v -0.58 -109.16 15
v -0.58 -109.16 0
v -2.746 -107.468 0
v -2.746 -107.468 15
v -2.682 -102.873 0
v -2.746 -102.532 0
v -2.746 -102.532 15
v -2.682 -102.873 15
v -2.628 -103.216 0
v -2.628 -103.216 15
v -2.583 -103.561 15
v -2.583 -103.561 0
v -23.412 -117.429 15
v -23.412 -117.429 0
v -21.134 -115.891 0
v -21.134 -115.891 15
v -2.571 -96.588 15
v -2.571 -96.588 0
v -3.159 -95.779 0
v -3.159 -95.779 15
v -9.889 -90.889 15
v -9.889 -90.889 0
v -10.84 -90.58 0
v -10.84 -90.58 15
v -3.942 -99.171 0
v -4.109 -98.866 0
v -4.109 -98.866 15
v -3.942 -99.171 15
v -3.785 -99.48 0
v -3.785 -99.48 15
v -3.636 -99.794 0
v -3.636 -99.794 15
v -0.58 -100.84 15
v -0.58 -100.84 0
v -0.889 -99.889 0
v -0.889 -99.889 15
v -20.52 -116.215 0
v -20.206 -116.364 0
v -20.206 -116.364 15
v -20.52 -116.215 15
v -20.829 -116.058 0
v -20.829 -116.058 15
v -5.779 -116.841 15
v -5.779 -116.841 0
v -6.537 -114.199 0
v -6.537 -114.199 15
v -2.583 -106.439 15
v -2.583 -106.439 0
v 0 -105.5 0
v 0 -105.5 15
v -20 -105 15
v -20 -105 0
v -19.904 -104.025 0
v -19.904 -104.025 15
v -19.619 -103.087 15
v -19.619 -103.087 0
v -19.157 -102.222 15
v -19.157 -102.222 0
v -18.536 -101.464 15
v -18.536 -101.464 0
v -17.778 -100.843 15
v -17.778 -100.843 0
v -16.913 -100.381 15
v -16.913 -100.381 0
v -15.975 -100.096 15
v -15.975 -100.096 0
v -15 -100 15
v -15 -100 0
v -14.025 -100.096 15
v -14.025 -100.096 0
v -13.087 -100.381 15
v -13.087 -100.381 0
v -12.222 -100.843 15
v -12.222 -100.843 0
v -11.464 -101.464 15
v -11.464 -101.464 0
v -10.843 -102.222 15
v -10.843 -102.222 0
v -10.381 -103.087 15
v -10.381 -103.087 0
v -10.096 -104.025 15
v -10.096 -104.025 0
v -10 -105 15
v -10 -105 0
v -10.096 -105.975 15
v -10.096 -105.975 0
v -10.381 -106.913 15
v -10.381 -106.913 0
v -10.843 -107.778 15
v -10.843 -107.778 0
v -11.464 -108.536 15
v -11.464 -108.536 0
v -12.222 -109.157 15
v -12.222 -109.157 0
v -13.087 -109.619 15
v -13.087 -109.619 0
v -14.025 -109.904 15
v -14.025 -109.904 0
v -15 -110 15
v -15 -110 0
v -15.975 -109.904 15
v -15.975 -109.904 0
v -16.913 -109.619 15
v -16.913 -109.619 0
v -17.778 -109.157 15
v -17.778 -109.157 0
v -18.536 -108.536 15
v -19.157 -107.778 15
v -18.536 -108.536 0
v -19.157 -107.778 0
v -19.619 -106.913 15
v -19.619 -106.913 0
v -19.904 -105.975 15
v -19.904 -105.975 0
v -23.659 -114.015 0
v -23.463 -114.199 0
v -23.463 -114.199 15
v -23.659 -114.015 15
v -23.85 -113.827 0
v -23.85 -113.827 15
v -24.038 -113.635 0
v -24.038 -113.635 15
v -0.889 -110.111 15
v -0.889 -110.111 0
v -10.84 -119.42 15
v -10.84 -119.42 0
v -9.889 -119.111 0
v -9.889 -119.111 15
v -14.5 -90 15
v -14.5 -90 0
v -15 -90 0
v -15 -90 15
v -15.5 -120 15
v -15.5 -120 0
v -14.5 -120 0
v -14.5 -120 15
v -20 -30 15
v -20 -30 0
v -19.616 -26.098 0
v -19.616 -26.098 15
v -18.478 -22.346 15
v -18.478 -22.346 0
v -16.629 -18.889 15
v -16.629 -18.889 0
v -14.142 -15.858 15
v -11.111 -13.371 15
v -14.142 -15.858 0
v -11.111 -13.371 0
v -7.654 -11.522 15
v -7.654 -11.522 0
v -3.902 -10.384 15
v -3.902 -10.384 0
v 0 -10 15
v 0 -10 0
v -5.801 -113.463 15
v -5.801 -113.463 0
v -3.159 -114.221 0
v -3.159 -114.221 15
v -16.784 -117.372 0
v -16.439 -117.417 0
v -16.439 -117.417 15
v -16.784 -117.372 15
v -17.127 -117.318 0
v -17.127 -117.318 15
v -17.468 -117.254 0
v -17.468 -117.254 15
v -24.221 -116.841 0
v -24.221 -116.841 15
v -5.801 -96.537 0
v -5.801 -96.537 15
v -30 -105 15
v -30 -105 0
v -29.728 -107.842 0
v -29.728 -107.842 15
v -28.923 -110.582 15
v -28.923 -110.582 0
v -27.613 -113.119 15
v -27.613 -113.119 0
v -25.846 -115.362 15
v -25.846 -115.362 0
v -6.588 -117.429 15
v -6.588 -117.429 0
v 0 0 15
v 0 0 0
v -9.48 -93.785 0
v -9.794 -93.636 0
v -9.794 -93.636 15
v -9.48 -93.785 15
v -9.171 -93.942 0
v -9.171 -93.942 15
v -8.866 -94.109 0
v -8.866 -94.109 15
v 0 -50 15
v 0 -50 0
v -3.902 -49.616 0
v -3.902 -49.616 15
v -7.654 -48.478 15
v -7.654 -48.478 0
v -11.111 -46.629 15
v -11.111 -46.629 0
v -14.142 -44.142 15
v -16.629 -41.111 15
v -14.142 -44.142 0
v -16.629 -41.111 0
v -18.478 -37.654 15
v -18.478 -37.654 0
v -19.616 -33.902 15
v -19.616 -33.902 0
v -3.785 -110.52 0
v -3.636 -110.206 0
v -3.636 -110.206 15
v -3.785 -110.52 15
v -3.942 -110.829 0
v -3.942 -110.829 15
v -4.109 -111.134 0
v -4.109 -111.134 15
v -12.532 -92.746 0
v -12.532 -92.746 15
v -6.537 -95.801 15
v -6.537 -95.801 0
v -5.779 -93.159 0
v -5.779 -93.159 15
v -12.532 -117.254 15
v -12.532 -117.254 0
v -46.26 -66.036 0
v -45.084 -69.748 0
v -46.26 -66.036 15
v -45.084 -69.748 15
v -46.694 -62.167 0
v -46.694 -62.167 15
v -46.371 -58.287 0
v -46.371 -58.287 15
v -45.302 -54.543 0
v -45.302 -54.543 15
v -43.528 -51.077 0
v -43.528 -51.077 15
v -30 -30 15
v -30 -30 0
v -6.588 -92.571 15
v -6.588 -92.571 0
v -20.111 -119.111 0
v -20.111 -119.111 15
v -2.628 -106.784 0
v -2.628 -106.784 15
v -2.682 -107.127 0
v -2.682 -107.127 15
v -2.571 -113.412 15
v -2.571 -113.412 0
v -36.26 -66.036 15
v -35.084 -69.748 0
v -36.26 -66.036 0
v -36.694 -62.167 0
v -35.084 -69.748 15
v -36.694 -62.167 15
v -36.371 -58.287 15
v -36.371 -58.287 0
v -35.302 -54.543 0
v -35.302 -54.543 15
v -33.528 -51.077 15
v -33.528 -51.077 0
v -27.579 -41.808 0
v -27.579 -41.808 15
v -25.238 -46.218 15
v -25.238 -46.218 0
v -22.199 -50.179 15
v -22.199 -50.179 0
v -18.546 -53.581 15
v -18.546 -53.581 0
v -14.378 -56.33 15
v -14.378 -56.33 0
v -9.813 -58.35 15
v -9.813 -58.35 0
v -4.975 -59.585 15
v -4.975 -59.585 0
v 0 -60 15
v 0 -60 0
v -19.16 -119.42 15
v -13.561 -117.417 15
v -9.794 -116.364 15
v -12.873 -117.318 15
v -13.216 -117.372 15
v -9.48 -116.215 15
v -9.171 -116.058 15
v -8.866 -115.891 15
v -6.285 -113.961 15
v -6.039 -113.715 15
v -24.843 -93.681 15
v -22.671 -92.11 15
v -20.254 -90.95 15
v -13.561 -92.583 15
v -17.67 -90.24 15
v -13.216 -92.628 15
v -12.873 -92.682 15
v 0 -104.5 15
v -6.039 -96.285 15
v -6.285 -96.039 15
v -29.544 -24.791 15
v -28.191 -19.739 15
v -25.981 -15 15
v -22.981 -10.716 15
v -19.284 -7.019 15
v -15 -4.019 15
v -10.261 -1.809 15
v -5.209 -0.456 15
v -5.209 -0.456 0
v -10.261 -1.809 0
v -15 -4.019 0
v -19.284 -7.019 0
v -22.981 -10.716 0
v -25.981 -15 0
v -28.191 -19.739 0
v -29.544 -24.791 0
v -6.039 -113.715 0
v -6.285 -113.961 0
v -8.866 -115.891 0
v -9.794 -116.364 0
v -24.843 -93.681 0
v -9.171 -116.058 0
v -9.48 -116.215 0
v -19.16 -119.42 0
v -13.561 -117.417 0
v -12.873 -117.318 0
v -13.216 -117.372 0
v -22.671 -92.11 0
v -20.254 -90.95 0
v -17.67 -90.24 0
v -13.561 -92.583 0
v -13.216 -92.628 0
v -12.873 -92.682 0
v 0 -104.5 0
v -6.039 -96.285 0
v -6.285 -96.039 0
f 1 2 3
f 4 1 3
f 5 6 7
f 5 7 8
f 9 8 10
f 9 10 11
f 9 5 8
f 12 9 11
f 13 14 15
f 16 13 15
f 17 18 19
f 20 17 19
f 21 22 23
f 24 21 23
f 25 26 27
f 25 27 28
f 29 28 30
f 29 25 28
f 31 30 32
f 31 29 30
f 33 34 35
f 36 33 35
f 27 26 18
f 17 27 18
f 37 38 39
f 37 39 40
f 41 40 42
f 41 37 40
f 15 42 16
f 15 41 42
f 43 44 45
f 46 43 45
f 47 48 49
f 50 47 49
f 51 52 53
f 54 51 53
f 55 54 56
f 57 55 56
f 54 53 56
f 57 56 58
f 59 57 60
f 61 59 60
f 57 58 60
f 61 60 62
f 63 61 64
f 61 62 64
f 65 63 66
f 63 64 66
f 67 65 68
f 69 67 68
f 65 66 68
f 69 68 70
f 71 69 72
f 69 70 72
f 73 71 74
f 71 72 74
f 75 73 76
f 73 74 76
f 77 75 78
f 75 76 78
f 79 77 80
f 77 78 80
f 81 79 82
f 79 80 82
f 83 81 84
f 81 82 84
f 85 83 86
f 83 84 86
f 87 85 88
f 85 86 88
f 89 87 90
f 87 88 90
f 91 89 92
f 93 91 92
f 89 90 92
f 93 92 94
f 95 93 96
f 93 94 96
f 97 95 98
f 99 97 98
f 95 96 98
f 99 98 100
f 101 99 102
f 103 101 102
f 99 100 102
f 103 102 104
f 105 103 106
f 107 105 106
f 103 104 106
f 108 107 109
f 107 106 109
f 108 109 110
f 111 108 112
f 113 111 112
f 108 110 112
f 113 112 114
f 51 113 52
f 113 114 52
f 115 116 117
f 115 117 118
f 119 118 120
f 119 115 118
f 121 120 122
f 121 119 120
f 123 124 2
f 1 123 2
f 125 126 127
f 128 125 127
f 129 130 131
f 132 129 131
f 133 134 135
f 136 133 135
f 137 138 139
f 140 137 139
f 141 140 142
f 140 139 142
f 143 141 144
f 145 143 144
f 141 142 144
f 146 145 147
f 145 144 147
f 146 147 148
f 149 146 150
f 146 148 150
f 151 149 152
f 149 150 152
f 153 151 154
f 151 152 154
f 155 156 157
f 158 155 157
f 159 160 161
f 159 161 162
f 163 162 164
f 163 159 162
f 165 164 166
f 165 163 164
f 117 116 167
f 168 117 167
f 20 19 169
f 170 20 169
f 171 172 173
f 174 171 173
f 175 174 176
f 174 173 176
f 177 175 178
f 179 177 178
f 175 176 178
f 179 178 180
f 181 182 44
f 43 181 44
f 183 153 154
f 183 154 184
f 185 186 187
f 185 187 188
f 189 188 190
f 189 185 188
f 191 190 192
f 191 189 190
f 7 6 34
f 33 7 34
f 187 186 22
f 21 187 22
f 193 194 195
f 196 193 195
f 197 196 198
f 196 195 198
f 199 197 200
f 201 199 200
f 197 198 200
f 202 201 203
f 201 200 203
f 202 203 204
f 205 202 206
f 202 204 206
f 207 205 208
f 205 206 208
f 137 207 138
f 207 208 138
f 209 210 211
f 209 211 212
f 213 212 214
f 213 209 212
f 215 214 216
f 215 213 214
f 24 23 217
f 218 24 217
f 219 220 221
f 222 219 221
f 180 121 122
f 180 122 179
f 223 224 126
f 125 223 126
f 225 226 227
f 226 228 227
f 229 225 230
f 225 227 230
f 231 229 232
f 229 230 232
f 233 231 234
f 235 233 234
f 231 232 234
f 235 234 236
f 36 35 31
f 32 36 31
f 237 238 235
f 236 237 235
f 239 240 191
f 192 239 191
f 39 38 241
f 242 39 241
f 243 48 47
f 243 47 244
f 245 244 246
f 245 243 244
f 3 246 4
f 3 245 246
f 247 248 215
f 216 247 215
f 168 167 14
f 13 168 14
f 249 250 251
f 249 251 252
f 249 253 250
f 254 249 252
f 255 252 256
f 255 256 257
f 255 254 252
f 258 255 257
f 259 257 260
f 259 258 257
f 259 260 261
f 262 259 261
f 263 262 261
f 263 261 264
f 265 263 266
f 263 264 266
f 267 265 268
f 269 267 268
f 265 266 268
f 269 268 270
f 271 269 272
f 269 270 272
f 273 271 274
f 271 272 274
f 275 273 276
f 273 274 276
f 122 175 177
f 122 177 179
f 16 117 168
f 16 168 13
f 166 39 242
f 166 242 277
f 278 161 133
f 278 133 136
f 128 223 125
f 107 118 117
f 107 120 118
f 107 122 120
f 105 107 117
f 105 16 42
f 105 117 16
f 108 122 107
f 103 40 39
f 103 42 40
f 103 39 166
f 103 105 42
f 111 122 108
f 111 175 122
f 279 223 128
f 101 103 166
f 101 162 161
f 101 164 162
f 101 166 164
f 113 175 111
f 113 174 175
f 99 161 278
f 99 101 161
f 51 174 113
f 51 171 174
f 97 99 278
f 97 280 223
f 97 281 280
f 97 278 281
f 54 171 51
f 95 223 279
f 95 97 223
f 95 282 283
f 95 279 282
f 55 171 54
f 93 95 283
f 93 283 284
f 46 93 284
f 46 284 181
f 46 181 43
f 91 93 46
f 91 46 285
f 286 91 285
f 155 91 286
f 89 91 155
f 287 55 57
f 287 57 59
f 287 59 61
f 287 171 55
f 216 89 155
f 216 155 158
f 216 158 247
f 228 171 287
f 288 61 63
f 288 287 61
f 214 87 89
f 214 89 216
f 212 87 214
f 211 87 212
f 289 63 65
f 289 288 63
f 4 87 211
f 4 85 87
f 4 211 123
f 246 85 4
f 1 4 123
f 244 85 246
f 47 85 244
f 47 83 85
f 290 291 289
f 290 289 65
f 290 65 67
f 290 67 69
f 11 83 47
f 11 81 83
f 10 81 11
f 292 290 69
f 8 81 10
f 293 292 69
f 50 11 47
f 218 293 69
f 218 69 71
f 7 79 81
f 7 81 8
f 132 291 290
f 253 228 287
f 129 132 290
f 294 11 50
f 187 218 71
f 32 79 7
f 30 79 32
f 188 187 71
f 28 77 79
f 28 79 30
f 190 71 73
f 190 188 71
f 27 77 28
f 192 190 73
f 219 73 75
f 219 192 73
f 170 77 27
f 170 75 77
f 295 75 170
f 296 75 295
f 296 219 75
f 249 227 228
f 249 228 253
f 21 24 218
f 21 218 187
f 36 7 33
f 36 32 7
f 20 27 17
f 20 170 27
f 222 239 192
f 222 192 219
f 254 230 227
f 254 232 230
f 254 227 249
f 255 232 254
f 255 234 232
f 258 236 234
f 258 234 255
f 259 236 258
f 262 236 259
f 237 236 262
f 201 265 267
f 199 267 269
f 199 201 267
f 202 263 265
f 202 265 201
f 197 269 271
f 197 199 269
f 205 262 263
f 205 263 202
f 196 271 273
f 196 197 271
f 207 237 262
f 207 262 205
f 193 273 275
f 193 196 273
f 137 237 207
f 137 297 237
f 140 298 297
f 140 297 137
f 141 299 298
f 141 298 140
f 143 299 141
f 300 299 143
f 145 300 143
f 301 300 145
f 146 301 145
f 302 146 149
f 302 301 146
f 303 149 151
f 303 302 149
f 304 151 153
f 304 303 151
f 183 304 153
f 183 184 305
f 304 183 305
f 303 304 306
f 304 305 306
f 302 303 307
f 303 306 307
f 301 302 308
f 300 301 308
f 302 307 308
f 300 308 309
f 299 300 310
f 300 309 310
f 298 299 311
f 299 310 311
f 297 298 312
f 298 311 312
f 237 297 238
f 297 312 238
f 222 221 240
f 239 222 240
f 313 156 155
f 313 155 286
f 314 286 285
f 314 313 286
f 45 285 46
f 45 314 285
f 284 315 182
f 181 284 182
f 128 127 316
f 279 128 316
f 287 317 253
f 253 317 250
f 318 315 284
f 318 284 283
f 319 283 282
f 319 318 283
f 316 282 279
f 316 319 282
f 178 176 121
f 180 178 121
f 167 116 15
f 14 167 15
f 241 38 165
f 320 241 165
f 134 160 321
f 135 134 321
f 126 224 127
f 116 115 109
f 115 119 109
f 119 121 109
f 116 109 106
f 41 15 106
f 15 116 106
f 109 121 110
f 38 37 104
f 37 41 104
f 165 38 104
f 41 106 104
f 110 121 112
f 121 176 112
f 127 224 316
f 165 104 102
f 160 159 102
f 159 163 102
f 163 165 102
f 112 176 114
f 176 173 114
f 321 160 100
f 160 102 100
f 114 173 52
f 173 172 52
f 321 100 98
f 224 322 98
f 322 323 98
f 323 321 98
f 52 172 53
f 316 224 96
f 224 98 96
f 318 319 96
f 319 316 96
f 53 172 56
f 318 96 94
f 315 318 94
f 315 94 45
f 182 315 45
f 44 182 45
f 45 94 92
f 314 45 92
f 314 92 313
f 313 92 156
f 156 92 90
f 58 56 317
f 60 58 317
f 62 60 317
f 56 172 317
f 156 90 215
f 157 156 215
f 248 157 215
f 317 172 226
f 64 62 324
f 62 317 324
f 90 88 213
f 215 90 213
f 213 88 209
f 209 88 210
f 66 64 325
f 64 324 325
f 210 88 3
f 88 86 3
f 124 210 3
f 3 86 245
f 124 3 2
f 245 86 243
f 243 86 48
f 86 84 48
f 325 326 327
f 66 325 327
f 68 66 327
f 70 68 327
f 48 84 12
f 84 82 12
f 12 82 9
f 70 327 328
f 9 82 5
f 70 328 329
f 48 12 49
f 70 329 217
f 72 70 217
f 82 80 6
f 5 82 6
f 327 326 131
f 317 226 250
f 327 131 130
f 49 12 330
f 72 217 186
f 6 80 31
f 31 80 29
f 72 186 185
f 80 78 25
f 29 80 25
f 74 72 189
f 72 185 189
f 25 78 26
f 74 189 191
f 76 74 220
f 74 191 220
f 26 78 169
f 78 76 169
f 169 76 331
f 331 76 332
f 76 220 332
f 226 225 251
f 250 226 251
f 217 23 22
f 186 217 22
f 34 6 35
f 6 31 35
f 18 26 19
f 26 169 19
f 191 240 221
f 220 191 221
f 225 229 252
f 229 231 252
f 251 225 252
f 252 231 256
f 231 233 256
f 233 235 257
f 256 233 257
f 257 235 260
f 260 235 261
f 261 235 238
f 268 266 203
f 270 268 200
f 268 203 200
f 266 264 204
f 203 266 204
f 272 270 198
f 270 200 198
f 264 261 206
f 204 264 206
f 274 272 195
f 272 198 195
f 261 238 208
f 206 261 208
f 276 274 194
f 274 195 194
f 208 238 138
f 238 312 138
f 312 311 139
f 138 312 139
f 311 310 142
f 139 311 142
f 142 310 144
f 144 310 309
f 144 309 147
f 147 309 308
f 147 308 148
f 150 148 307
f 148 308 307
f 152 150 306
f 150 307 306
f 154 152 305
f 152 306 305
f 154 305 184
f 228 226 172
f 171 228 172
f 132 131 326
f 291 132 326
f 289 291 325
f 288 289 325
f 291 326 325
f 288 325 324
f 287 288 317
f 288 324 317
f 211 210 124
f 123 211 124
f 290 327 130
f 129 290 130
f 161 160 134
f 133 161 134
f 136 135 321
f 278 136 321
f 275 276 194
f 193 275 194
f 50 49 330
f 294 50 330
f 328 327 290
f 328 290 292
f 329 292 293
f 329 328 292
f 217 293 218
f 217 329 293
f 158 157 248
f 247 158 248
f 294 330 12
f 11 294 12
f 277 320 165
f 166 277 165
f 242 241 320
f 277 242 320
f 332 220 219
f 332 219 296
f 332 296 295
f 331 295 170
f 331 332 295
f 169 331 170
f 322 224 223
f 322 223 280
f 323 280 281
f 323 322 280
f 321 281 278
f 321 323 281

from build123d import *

# Parameters (mm, degrees)
BOSS_EXTRUDE1_DEPTH = 15
FILLET1_R           = 20
CUT_EXTRUDE1_START  = -15
CUT_EXTRUDE1_DEPTH  = 15
BOSS_EXTRUDE2_START = -15
BOSS_EXTRUDE2_DEPTH = 15


with BuildPart() as part:
    # Sketch1 → Boss-Extrude1 (new body)
    # profile 1 of 6: a face of its own
    with BuildSketch(Plane.XY):
        with BuildLine():
            Line((-20, -30), (-30, -30))
            ThreePointArc((-30, -30), (-29.388396861, -36.026784376), (-27.578524672, -41.807835403))
            Line((-27.578524672, -41.807835403), (-20, -30))
        make_face()
    # profile 2 of 6: a face of its own
    with BuildSketch(Plane.XY):
        with BuildLine():
            Line((0, -10), (0, 0))
            ThreePointArc((0, 0), (-21.213203436, -8.786796564), (-30, -30))
            Line((-30, -30), (-20, -30))
            ThreePointArc((-20, -30), (-14.142135624, -15.857864376), (0, -10))
        make_face()
    # profile 3 of 6: a face of its own
    with BuildSketch(Plane.XY):
        with BuildLine():
            Line((0, -60), (0, -50))
            ThreePointArc((0, -50), (-14.142135624, -44.142135624), (-20, -30))
            Line((-20, -30), (-27.578524672, -41.807835403))
            ThreePointArc((-27.578524672, -41.807835403), (-16.519154608, -55.04231481), (0, -60))
        make_face()
    # profile 4 of 6: a face of its own
    with BuildSketch(Plane.XY):
        with BuildLine():
            ThreePointArc((-27.578524672, -41.807835403), (-29.388396861, -36.026784376), (-30, -30))
            Line((-30, -30), (-49.254650189, -60))
            Line((-49.254650189, -60), (-30, -105))
            ThreePointArc((-30, -105), (-28.650020621, -98.780921528), (-24.84307506, -93.681260081))
            Line((-24.84307506, -93.681260081), (-39.254650189, -60))
            Line((-39.254650189, -60), (-27.578524672, -41.807835403))
        make_face()
    # profile 5 of 6: a face of its own
    with BuildSketch(Plane.XY):
        with BuildLine():
            ThreePointArc((-24.84307506, -93.681260081), (-28.650020621, -98.780921528), (-30, -105))
            Line((-30, -105), (-20, -105))
            Line((-20, -105), (-24.84307506, -93.681260081))
        make_face()
    # profile 6 of 6: a face of its own
    with BuildSketch(Plane.XY):
        with BuildLine():
            Line((-20, -105), (-30, -105))
            ThreePointArc((-30, -105), (-15, -120), (0, -105))
            ThreePointArc((0, -105), (-8.780921528, -91.349979379), (-24.84307506, -93.681260081))
            Line((-24.84307506, -93.681260081), (-20, -105))
        make_face()
        with BuildLine():
            ThreePointArc((-10, -105), (-15, -110), (-20, -105))
            ThreePointArc((-20, -105), (-15, -100), (-10, -105))
        make_face(mode=Mode.SUBTRACT)
    extrude(amount=BOSS_EXTRUDE1_DEPTH)

    # Fillet1
    fillet1_edges = [part.edges().sort_by_distance(p)[0] for p in [
        (-39.254650189, -60, 7.5),
        (-49.254650189, -60, 7.5),
    ]]
    fillet(fillet1_edges, radius=FILLET1_R)

    # Sketch2 → Cut-Extrude1 (cut)
    with BuildSketch(Plane.XY.offset(15).offset(CUT_EXTRUDE1_START)):
        with BuildLine():
            Line((-15, -90), (-15, -92.5))
            ThreePointArc((-15, -92.5), (-3.506810704, -109.914936399), (-24.038127106, -113.634944031))
            Line((-24.038127106, -113.634944031), (-25.845752528, -115.361932837))
            ThreePointArc((-25.845752528, -115.361932837), (-1.208172845, -110.897923679), (-15, -90))
        make_face()
    extrude(amount=CUT_EXTRUDE1_DEPTH, mode=Mode.SUBTRACT)

    # Sketch3 → Boss-Extrude2 (add)
    with BuildSketch(Plane.XY.offset(15).offset(BOSS_EXTRUDE2_START)):
        with BuildLine():
            Line((-14.5, -90), (-15, -90))
            Line((-15, -90), (-15, -92.5))
            ThreePointArc((-15, -92.5), (-14.279138, -92.520802992), (-13.560675373, -92.583142724))
            Line((-13.560675373, -92.583142724), (-14.5, -90))
        make_face()
        with BuildLine():
            Line((-10.840273343, -90.579643758), (-12.53185915, -92.746091205))
            ThreePointArc((-12.53185915, -92.746091205), (-11.13728757, -93.111793546), (-9.79410102, -93.635642746))
            Line((-9.79410102, -93.635642746), (-9.889216826, -90.888660753))
            Line((-9.889216826, -90.888660753), (-10.840273343, -90.579643758))
        make_face()
        with BuildLine():
            Line((-6.587729713, -92.570852458), (-8.865992497, -94.108537658))
            ThreePointArc((-8.865992497, -94.108537658), (-7.652684346, -94.88728757), (-6.53711633, -95.800565236))
            Line((-6.53711633, -95.800565236), (-5.778712718, -93.158637711))
            Line((-5.778712718, -93.158637711), (-6.587729713, -92.570852458))
        make_face()
        with BuildLine():
            Line((-3.158637711, -95.778712718), (-5.800565236, -96.53711633))
            ThreePointArc((-5.800565236, -96.53711633), (-4.88728757, -97.652684346), (-4.108537658, -98.865992497))
            Line((-4.108537658, -98.865992497), (-2.570852458, -96.587729713))
            Line((-2.570852458, -96.587729713), (-3.158637711, -95.778712718))
        make_face()
        with BuildLine():
            Line((-0.888660753, -99.889216826), (-3.635642746, -99.79410102))
            ThreePointArc((-3.635642746, -99.79410102), (-3.111793546, -101.13728757), (-2.746091205, -102.53185915))
            Line((-2.746091205, -102.53185915), (-0.579643758, -100.840273343))
            Line((-0.579643758, -100.840273343), (-0.888660753, -99.889216826))
        make_face()
        with BuildLine():
            Line((0, -104.5), (-2.583142724, -103.560675373))
            ThreePointArc((-2.583142724, -103.560675373), (-2.5, -105), (-2.583142724, -106.439324627))
            Line((-2.583142724, -106.439324627), (0, -105.5))
            Line((0, -105.5), (0, -104.5))
        make_face()
        with BuildLine():
            Line((-0.579643758, -109.159726657), (-2.746091205, -107.46814085))
            ThreePointArc((-2.746091205, -107.46814085), (-3.111793546, -108.86271243), (-3.635642746, -110.20589898))
            Line((-3.635642746, -110.20589898), (-0.888660753, -110.110783174))
            Line((-0.888660753, -110.110783174), (-0.579643758, -109.159726657))
        make_face()
        with BuildLine():
            ThreePointArc((-21.134007503, -115.891462342), (-22.347315654, -115.11271243), (-23.46288367, -114.199434764))
            Line((-23.46288367, -114.199434764), (-24.221287282, -116.841362289))
            Line((-24.221287282, -116.841362289), (-23.412270287, -117.429147542))
            Line((-23.412270287, -117.429147542), (-21.134007503, -115.891462342))
        make_face()
        with BuildLine():
            Line((-2.570852458, -113.412270287), (-4.108537658, -111.134007503))
            ThreePointArc((-4.108537658, -111.134007503), (-4.88728757, -112.347315654), (-5.800565236, -113.46288367))
            Line((-5.800565236, -113.46288367), (-3.158637711, -114.221287282))
            Line((-3.158637711, -114.221287282), (-2.570852458, -113.412270287))
        make_face()
        with BuildLine():
            ThreePointArc((-17.46814085, -117.253908795), (-18.86271243, -116.888206454), (-20.20589898, -116.364357254))
            Line((-20.20589898, -116.364357254), (-20.110783174, -119.111339247))
            Line((-20.110783174, -119.111339247), (-19.159726657, -119.420356242))
            Line((-19.159726657, -119.420356242), (-17.46814085, -117.253908795))
        make_face()
        with BuildLine():
            Line((-5.778712718, -116.841362289), (-6.53711633, -114.199434764))
            ThreePointArc((-6.53711633, -114.199434764), (-7.652684346, -115.11271243), (-8.865992497, -115.891462342))
            Line((-8.865992497, -115.891462342), (-6.587729713, -117.429147542))
            Line((-6.587729713, -117.429147542), (-5.778712718, -116.841362289))
        make_face()
        with BuildLine():
            ThreePointArc((-13.560675373, -117.416857276), (-15, -117.5), (-16.439324627, -117.416857276))
            Line((-16.439324627, -117.416857276), (-15.5, -120))
            Line((-15.5, -120), (-14.5, -120))
            Line((-14.5, -120), (-13.560675373, -117.416857276))
        make_face()
        with BuildLine():
            Line((-9.889216826, -119.111339247), (-9.79410102, -116.364357254))
            ThreePointArc((-9.79410102, -116.364357254), (-11.13728757, -116.888206454), (-12.53185915, -117.253908795))
            Line((-12.53185915, -117.253908795), (-10.840273343, -119.420356242))
            Line((-10.840273343, -119.420356242), (-9.889216826, -119.111339247))
        make_face()
    extrude(amount=BOSS_EXTRUDE2_DEPTH)


solid = part.part
